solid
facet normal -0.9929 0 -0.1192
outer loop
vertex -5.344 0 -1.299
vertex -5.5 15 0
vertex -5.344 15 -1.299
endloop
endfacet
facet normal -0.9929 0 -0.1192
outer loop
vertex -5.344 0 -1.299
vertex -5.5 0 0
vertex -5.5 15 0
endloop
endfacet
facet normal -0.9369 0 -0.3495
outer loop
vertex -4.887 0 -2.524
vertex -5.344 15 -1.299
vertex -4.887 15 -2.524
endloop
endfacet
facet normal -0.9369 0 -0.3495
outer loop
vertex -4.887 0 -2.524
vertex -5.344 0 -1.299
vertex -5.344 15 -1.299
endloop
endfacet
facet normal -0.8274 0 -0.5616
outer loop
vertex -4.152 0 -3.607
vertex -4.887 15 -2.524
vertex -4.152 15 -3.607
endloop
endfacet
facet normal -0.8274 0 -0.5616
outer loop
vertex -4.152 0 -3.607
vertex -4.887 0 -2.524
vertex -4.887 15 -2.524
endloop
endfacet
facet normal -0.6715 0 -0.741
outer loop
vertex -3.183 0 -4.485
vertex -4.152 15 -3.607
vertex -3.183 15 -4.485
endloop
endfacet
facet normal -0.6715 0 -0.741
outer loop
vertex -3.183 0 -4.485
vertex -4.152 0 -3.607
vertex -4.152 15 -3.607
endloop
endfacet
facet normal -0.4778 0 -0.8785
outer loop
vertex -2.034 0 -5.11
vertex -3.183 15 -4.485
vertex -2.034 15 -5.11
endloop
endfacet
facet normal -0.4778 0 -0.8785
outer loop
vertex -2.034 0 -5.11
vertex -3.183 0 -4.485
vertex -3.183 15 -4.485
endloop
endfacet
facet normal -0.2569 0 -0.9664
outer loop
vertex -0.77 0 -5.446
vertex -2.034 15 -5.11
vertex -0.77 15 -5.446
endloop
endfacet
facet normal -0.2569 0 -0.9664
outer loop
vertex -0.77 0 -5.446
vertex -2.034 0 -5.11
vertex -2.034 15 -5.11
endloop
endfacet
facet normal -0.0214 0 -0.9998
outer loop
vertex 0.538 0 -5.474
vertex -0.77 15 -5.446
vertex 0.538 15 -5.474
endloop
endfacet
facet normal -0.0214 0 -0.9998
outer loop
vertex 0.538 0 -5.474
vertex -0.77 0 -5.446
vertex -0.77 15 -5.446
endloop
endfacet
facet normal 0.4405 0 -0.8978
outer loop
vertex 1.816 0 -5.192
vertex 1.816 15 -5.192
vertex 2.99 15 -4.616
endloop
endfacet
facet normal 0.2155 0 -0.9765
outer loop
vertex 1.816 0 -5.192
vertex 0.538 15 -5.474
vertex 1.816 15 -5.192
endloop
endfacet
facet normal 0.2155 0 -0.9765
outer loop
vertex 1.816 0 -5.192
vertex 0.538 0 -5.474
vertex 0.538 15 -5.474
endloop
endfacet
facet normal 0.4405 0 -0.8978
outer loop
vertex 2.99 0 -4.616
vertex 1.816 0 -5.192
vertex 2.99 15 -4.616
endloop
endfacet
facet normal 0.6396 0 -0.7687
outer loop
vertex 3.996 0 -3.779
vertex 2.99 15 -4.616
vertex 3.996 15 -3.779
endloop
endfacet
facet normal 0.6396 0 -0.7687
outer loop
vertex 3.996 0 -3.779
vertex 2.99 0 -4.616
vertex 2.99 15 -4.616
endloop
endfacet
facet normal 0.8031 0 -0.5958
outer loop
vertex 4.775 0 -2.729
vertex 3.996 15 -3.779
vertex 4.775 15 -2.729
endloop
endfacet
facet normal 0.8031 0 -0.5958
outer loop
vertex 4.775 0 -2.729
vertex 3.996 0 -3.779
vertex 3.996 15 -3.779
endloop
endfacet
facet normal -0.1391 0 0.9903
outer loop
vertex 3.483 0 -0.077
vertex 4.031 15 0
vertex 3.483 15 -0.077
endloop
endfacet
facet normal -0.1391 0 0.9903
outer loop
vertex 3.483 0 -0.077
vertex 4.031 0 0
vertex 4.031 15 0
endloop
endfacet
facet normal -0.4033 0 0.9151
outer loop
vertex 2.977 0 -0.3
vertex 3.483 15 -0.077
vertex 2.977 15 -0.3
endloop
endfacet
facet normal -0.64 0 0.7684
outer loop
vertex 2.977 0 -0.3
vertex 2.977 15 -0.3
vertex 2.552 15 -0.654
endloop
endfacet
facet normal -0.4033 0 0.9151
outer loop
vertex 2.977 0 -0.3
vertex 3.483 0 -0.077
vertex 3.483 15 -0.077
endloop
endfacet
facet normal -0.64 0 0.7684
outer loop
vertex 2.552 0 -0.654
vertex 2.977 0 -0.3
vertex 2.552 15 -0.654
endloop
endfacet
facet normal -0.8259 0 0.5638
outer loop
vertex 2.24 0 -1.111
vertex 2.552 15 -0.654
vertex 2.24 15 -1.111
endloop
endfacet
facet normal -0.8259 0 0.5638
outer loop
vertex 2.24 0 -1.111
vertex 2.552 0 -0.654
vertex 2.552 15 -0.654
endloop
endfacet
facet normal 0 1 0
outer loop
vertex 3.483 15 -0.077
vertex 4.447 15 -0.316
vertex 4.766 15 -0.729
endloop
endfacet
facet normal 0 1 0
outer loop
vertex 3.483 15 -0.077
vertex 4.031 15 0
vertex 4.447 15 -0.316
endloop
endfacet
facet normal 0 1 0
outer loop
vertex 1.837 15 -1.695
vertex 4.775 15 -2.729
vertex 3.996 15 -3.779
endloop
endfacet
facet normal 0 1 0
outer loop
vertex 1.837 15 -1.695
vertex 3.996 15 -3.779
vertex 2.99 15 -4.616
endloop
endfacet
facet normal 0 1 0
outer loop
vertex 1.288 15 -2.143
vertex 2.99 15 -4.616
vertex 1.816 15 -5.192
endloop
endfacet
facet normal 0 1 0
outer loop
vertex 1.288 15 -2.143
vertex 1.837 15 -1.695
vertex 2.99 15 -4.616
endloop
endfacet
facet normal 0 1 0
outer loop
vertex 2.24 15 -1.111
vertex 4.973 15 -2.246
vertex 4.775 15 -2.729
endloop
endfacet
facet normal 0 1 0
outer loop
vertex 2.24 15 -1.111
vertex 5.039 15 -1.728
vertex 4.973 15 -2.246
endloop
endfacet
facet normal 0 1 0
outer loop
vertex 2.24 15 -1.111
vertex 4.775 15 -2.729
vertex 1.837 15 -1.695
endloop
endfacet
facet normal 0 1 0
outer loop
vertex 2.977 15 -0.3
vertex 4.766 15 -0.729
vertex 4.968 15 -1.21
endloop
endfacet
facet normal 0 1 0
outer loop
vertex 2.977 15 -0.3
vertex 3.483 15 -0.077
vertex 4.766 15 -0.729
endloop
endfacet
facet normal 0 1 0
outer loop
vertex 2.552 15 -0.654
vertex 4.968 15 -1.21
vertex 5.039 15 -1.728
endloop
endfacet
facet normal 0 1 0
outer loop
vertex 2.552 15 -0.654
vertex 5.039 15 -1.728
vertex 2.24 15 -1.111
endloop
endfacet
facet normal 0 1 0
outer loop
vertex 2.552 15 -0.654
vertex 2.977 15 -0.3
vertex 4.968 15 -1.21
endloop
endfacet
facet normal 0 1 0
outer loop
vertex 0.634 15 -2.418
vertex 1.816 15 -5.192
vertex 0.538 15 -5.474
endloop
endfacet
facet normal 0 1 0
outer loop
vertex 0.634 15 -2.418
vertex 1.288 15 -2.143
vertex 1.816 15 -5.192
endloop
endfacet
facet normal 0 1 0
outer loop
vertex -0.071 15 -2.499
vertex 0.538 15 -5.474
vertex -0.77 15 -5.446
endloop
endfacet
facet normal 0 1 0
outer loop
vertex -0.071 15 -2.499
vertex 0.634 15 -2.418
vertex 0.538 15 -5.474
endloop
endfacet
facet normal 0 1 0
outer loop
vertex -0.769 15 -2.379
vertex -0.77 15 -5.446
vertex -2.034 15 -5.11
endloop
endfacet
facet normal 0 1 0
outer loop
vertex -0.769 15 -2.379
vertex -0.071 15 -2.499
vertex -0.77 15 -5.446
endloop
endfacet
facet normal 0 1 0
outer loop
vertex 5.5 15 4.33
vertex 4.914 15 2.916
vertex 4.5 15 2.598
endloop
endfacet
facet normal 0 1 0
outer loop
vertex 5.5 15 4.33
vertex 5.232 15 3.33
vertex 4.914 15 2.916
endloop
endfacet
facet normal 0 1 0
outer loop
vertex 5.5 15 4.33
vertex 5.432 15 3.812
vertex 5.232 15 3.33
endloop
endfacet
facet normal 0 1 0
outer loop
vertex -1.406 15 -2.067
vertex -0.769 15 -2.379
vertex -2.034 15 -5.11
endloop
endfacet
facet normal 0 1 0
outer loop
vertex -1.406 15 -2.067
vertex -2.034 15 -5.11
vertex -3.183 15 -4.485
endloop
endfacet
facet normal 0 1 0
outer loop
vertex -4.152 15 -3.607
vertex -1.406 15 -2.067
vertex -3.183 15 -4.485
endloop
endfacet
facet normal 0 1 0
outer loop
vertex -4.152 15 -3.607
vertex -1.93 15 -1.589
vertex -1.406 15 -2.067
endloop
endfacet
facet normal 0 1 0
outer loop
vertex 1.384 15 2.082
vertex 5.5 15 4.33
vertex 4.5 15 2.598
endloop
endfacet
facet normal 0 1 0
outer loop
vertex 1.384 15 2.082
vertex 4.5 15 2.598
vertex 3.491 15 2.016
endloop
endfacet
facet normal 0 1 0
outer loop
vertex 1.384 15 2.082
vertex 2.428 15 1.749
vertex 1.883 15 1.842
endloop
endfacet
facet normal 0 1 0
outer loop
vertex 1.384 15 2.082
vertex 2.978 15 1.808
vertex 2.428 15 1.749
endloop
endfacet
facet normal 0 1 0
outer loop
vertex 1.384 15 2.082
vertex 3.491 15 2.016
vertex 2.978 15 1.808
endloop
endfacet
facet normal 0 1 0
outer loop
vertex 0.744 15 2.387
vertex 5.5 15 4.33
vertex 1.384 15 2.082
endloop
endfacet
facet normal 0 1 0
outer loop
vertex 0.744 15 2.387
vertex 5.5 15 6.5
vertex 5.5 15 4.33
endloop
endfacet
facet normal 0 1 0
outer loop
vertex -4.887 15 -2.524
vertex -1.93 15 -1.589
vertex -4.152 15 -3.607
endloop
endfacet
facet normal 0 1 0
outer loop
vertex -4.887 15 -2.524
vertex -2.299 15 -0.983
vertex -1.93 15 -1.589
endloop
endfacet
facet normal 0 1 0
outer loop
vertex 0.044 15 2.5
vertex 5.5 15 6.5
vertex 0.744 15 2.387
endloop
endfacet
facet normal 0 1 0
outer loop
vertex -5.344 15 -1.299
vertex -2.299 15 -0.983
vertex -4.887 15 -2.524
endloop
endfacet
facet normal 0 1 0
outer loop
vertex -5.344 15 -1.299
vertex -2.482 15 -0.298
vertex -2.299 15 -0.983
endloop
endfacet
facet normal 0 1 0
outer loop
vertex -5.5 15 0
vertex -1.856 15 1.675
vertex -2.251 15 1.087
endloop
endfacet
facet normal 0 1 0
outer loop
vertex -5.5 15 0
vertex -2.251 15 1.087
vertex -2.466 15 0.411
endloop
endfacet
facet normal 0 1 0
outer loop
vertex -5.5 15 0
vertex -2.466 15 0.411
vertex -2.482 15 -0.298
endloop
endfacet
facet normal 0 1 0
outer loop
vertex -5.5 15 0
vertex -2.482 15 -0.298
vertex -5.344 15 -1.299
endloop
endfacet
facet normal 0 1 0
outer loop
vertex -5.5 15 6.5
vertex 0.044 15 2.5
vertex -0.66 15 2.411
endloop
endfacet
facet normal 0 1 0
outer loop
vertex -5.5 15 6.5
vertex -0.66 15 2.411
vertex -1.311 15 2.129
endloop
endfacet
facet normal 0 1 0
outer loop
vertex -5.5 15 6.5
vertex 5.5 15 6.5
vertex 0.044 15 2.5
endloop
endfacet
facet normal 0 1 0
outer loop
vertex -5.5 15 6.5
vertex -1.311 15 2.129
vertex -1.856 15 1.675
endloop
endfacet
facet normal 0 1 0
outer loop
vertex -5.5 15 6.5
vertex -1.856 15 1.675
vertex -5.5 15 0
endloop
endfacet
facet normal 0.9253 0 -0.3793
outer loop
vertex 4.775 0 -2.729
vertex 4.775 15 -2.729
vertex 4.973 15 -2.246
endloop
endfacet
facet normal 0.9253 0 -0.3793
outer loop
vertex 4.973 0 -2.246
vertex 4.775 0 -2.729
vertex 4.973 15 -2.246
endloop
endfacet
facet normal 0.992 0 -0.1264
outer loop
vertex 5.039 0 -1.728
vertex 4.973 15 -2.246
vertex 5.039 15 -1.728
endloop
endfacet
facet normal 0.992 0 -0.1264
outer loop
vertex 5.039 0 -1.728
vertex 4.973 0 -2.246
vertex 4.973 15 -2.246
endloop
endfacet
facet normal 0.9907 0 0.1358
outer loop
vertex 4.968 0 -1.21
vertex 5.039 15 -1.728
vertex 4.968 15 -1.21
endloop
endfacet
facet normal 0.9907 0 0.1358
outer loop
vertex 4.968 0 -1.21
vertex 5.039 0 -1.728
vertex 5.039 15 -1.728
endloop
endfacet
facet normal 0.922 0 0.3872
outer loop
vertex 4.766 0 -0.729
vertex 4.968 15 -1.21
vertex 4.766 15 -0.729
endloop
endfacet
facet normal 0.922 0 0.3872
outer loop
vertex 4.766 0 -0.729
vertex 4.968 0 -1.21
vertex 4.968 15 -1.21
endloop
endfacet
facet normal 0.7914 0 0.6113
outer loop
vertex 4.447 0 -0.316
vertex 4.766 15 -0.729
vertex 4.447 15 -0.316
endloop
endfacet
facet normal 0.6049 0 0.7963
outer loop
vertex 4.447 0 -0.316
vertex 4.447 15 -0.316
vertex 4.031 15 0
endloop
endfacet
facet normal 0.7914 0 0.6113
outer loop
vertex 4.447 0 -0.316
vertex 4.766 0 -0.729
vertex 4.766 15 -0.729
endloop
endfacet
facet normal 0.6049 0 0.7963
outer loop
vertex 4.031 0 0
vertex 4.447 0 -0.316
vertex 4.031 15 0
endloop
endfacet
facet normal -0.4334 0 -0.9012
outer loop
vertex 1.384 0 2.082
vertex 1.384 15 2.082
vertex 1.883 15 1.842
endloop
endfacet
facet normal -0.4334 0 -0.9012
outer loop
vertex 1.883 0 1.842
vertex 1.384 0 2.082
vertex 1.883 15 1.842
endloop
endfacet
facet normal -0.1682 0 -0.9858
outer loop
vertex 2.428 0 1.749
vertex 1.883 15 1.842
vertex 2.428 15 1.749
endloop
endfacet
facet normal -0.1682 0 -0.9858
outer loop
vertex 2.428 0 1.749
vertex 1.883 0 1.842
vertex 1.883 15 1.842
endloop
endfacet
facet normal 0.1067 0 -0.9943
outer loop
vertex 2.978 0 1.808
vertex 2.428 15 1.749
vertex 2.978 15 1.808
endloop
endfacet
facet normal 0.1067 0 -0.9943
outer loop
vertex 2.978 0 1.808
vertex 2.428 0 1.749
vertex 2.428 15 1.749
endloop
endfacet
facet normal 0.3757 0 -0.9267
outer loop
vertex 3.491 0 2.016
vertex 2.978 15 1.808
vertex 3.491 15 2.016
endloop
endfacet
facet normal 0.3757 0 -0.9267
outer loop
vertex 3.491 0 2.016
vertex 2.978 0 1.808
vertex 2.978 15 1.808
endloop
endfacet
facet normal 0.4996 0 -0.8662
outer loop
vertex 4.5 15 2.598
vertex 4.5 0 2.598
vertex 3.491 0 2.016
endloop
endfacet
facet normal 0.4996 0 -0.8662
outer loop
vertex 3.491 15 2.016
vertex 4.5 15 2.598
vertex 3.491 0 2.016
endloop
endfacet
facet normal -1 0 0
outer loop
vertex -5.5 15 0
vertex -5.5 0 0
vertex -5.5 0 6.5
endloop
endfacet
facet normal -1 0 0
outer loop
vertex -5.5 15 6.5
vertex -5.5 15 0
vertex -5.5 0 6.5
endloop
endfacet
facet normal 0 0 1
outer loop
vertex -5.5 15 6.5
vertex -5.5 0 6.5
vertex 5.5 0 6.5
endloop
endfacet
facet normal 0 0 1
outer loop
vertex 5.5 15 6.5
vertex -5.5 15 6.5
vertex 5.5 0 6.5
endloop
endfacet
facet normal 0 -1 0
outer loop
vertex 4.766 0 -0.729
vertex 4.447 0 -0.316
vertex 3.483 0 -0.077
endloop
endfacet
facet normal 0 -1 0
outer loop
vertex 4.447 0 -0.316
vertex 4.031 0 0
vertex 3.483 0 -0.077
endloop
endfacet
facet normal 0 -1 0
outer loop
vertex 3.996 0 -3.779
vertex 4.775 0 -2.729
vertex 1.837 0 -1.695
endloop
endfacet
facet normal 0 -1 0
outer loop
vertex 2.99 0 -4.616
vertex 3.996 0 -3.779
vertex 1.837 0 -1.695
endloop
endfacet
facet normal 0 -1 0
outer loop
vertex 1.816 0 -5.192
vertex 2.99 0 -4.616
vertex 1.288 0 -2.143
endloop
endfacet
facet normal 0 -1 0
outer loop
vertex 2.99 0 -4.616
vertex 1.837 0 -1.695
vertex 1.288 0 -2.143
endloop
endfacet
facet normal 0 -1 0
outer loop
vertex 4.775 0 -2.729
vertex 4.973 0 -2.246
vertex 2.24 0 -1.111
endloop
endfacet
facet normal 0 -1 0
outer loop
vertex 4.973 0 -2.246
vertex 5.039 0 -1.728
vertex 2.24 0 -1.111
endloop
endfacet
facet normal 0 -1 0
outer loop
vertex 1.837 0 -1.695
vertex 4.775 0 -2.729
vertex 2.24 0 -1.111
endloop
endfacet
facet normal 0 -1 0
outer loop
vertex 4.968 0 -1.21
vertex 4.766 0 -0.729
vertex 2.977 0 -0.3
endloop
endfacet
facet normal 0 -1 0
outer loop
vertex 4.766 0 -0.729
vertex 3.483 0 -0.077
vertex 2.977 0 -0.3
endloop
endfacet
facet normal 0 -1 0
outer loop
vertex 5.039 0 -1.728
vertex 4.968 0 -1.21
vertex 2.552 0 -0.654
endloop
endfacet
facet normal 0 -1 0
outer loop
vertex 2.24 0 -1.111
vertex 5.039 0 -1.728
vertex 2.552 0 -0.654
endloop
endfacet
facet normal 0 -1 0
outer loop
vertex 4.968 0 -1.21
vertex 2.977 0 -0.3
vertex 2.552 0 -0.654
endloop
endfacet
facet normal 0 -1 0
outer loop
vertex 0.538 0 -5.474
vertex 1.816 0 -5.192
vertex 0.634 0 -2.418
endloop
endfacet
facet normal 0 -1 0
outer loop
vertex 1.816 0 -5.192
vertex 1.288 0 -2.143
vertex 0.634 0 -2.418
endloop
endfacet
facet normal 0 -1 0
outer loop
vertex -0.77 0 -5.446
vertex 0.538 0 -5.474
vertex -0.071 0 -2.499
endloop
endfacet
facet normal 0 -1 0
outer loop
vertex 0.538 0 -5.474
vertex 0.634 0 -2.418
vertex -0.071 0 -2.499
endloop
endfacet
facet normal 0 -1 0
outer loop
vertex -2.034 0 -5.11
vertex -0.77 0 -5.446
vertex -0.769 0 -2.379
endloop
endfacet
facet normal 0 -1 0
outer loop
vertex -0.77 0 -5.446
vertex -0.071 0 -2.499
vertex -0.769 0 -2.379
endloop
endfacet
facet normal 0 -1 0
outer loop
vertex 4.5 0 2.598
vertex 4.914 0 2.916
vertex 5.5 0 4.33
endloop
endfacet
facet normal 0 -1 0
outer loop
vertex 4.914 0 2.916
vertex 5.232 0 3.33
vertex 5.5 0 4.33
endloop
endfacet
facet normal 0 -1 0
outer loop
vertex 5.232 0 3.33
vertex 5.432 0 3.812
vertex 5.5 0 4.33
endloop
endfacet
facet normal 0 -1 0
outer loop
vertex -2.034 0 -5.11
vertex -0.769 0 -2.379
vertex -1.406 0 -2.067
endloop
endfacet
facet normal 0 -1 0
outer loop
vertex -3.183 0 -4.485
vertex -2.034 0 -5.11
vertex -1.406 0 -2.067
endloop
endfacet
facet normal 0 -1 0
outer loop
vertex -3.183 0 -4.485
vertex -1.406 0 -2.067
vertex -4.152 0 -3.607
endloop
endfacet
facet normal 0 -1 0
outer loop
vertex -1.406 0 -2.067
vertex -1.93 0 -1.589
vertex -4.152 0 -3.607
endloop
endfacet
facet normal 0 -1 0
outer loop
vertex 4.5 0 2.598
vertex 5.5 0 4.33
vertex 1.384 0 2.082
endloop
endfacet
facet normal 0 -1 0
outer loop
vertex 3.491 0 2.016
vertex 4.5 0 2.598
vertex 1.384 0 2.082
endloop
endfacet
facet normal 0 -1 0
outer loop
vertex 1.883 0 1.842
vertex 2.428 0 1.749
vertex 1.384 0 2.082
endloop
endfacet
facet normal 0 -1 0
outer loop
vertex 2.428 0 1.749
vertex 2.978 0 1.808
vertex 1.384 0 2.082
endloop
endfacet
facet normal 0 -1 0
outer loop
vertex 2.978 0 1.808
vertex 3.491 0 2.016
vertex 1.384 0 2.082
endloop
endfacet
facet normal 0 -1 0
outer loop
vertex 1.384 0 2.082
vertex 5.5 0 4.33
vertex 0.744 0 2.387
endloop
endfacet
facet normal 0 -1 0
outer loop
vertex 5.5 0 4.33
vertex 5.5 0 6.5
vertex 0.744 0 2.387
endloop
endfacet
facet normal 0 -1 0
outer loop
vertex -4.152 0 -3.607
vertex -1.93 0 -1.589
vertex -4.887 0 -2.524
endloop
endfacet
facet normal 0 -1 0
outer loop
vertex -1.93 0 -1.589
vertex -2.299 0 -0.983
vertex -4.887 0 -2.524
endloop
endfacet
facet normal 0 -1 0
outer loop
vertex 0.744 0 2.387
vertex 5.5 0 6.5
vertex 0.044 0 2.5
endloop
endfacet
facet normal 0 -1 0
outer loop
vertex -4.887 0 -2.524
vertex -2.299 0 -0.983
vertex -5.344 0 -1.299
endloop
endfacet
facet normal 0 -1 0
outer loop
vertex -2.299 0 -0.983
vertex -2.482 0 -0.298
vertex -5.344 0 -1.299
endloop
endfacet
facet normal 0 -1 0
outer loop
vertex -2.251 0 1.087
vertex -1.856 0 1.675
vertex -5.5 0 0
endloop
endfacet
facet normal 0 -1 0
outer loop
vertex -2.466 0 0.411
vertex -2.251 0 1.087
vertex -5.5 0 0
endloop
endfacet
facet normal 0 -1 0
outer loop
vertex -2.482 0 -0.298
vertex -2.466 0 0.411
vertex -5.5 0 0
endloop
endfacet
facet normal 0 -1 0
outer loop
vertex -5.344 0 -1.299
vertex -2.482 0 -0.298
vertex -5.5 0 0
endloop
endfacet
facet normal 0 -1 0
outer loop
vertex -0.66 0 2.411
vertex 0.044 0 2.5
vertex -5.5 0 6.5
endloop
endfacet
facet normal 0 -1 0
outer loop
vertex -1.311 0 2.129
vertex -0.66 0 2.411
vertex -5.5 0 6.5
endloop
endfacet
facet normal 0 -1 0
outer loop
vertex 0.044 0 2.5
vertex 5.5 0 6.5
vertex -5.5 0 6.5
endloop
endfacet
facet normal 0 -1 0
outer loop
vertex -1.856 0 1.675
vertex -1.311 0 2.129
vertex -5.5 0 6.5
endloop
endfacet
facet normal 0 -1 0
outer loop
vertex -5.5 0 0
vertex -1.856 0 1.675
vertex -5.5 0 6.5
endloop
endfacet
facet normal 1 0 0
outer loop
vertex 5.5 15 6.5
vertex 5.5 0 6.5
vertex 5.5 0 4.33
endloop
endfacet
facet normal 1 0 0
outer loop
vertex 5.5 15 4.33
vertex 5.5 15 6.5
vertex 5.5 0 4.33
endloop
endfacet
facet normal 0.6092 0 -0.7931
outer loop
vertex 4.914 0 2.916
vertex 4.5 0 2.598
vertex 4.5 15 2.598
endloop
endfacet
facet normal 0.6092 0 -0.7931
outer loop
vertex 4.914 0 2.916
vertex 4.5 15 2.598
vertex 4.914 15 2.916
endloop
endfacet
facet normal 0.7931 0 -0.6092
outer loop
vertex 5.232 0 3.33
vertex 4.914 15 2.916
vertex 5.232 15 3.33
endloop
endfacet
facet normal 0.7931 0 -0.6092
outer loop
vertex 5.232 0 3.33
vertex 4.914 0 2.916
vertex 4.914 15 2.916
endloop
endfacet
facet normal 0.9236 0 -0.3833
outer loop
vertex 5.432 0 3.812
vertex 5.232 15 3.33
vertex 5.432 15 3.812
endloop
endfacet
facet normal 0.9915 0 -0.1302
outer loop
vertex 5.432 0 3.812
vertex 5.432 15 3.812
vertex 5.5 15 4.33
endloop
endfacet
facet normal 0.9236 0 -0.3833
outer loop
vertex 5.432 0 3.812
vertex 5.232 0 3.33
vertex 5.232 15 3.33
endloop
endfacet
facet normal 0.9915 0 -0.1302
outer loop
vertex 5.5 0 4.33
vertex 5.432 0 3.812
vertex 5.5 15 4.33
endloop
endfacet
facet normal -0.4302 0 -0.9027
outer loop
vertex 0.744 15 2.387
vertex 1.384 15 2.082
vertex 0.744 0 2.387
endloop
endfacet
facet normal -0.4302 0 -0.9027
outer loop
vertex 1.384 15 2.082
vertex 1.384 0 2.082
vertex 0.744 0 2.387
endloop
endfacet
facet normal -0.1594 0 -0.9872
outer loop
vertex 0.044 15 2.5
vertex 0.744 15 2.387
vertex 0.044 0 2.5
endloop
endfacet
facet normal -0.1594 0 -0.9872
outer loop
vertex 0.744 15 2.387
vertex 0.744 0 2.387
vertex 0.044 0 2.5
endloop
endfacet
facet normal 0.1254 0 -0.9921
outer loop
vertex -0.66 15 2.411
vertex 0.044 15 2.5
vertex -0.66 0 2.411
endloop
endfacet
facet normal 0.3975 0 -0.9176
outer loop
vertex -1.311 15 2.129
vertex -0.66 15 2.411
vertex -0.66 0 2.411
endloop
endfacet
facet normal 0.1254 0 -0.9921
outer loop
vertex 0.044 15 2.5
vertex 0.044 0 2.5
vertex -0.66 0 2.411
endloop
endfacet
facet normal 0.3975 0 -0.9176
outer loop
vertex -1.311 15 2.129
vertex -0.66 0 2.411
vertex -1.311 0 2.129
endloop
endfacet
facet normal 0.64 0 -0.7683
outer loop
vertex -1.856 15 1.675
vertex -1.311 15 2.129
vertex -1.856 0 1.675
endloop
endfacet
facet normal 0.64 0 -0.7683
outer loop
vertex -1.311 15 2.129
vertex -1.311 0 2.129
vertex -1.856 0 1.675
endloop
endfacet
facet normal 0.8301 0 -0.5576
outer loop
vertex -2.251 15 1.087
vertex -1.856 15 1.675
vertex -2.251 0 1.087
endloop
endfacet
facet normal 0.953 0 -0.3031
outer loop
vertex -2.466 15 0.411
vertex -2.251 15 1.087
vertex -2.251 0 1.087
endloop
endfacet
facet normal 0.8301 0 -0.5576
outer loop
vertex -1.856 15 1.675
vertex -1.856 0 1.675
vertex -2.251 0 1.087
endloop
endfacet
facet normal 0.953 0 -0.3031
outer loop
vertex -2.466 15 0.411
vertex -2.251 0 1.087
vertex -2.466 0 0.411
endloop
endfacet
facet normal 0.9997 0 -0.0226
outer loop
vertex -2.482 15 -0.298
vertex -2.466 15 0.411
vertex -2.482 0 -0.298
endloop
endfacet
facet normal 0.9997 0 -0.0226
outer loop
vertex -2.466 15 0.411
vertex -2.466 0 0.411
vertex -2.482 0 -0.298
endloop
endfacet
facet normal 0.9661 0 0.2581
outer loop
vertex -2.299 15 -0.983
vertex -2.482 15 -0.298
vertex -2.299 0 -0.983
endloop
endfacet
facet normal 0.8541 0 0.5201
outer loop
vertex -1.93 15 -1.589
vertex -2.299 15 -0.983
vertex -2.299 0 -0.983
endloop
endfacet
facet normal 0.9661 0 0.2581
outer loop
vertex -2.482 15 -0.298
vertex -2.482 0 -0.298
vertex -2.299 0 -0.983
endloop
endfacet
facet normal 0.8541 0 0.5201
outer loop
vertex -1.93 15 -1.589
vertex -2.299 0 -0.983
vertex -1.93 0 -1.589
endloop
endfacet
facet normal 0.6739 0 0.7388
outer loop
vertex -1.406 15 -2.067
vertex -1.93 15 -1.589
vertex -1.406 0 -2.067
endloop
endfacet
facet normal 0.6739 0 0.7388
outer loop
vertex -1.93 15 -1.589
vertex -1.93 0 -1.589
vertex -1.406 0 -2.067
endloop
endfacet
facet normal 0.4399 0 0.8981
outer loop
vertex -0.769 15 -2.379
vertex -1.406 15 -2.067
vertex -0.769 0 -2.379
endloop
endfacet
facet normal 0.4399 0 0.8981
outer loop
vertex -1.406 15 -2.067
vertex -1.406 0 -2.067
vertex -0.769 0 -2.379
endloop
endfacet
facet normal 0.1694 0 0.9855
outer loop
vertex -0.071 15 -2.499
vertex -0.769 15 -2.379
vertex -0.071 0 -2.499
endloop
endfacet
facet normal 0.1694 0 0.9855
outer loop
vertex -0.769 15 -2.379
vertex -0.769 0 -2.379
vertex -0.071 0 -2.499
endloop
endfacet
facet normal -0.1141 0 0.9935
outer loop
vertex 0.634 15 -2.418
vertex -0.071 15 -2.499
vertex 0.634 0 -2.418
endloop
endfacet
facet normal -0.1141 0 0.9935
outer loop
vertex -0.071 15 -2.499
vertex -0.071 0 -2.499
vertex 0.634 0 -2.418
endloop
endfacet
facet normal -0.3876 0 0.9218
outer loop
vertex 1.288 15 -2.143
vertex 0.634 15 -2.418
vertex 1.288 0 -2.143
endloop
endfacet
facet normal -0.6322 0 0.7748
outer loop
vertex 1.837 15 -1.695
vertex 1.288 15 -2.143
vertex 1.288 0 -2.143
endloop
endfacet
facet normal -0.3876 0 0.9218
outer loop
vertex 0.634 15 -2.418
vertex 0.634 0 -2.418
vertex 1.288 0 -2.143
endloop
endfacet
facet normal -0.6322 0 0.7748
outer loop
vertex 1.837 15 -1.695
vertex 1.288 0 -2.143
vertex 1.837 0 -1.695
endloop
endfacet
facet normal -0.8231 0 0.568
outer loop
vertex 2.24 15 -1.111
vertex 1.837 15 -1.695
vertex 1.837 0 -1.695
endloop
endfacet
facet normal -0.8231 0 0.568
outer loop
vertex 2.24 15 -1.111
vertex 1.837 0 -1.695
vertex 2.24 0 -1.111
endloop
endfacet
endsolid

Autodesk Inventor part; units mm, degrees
ref_plane "YZ Plane" through (0, 0, 0) normal (1, 0, 0) x (0, 1, 0)
ref_plane "XZ Plane" through (0, 0, 0) normal (0, 1, 0) x (-1, 0, 0)
ref_plane "XY Plane" through (0, 0, 0) normal (0, 0, 1) x (1, 0, 0)
sketch "Sketch1" plane through (0, 0, 0) normal (0, 1, 0) x (-1, 0, 0)
  circle A0 centre (0, 0) radius 2.5
  circle A1 centre (0, 0) radius 5.5
  line L0 (5.5, 5.5) -> (-5.5, 5.5)
  line L1 (-5.5, 5.5) -> (-5.5, 6.5)
  line L2 (-5.5, 6.5) -> (5.5, 6.5)
  line L3 (5.5, 6.5) -> (5.5, 5.5)
  line L4 (0, -7.9) -> (0, 8.9) construction
  line L5 (0, 0) -> (-5.5, 3.175426)
  line L6 (0, 0) -> (-5.5, 0)
  line L7 (5.5, 0) -> (5.5, 5.5)
  line L8 (-5.5, 0) -> (-5.5, 5.5)
  point P0 (-2.5, 0)
  point P1 (0, 5.5)
  point P2 (-2.165064, 1.25)
  dimension "d0" = 5
  dimension "d1" = 3
  dimension "d4" = 30
  dimension "d5" = 1
sketch "Sketch1 outline for Extrusion1" plane through (0, 0, 0) normal (0, 1, 0) x (-1, 0, 0)
  line L0 (5.5, 0) -> (5.5, 6.5)
  line L1 (5.5, 6.5) -> (-5.5, 6.5)
  line L2 (-5.5, 6.5) -> (-5.5, 3.175426)
  line L3 (-5.5, 3.175426) -> (-2.165064, 1.25)
  arc A0 (-2.165064, 1.25) -> (-2.5, 0) centre (0, 0) cw
  line L4 (-2.5, 0) -> (-5.5, 0)
  arc A1 (-5.5, 0) -> (5.5, 0) centre (0, 0) ccw
extrude "Extrusion1" add sketch "Sketch1 outline for Extrusion1" along normal blind 15
fillet "Fillet1" radius 2 4 edges at (5.5, 7.5, 3.1754) (2.1651, 7.5, 1.25) (2.5, 7.5, 0) (5.5, 7.5, 0)
properties part number "Cable Clip"
